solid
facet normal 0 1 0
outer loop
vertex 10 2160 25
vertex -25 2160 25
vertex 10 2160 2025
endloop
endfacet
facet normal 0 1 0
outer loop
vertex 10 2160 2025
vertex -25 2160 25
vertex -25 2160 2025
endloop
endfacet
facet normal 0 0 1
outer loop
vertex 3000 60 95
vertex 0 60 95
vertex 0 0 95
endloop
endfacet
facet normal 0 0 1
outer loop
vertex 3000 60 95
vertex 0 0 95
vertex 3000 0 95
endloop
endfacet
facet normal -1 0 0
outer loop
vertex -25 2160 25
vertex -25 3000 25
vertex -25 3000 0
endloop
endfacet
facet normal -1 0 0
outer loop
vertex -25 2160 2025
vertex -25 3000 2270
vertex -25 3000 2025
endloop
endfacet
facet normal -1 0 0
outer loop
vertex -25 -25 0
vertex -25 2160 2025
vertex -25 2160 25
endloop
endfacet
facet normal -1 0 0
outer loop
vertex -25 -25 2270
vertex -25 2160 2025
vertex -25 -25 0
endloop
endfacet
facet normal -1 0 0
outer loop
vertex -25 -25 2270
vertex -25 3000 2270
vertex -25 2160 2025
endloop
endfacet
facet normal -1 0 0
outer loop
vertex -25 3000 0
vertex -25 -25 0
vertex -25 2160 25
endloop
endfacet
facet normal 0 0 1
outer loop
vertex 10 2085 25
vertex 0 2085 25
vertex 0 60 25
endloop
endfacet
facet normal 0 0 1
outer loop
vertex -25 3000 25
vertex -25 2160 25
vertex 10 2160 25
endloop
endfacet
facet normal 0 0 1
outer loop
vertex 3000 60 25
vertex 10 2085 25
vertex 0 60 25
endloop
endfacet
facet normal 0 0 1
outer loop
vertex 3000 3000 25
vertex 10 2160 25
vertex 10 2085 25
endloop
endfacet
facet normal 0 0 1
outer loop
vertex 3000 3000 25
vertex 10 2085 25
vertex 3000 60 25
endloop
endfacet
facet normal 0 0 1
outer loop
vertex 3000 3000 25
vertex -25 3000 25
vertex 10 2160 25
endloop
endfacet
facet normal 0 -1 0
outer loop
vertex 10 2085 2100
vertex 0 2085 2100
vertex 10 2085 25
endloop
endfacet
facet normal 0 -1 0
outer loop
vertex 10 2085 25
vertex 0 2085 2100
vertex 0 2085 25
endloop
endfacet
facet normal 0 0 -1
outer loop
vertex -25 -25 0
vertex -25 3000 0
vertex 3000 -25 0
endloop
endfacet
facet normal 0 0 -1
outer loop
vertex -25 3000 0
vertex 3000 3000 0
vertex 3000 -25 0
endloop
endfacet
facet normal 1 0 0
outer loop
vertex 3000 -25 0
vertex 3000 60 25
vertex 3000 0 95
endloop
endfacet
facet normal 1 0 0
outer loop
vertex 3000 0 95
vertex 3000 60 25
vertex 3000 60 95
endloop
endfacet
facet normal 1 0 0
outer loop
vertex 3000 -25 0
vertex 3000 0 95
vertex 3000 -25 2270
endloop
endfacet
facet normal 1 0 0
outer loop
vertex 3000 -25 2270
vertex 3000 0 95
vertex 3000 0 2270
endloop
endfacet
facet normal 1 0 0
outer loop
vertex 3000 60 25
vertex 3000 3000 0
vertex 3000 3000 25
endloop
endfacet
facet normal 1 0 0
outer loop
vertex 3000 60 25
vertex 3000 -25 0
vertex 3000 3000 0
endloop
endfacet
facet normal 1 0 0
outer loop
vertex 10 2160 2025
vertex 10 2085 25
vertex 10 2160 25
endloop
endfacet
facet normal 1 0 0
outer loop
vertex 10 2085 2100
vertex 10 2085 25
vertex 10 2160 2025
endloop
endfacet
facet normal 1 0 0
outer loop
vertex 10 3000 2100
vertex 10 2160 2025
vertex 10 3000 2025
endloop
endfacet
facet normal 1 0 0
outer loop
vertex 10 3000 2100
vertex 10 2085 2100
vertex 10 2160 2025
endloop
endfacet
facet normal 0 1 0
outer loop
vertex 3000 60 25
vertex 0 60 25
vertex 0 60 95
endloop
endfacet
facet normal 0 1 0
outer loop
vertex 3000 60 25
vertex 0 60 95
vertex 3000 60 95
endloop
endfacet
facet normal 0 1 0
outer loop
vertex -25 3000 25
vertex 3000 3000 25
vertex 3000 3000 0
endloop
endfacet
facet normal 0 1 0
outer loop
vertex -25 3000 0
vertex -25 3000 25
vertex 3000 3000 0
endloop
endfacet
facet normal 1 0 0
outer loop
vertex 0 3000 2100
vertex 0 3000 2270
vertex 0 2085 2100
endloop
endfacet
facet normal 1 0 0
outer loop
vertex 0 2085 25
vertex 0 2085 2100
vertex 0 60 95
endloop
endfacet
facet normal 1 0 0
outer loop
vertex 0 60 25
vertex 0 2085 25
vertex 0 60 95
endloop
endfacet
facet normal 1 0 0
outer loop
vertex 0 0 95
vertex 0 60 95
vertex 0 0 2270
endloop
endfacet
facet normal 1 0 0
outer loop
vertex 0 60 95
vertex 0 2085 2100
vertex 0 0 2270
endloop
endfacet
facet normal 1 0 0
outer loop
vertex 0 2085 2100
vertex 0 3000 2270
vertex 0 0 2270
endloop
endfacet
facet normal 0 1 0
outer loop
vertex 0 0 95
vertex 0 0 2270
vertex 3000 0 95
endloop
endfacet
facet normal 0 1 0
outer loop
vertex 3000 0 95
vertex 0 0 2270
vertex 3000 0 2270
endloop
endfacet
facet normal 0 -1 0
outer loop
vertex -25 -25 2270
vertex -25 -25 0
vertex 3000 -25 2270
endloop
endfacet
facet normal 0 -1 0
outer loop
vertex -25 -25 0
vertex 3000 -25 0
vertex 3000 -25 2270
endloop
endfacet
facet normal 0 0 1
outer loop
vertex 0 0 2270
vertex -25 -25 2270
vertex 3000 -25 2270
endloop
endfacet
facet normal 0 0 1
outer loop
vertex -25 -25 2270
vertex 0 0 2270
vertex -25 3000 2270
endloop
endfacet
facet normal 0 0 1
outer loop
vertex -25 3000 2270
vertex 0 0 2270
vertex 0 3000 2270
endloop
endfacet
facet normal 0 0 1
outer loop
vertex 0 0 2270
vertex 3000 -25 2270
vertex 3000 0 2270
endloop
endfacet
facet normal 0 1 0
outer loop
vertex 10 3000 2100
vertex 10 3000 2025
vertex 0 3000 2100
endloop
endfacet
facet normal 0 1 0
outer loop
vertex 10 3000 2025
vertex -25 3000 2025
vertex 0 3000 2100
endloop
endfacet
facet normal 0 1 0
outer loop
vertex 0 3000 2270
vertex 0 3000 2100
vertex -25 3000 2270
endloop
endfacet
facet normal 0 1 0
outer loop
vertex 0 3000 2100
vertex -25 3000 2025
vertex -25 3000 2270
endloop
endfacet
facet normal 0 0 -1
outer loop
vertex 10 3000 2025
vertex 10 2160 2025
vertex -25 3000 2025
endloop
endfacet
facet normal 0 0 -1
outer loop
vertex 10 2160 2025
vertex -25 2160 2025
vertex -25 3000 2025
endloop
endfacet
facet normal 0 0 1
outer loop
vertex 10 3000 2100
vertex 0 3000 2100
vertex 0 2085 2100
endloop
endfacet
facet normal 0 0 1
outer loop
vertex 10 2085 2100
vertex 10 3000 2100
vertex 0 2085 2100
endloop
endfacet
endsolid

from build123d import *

# Parameters (mm, degrees)
F0_W      = 3000
F0_H      = 3000
F1_DEPTH  = 25
F2_W      = 3000
F2_H      = 60
F3_DEPTH  = 70
F4_W      = 3000
F4_H      = 2175
F4_H_2    = 95
F5_DEPTH  = 25
F7_DEPTH  = 25
F8_W      = 840
F8_H      = 2000
F9_DEPTH  = 25
F10_DEPTH = 10


with BuildPart() as f1:
    # F0 (on Top) → F1 (new body)
    with BuildSketch(Plane.XY):
        with Locations((1500, 1500)):
            Rectangle(F0_W, F0_H)
    extrude(amount=F1_DEPTH)

    # F2 (on face) → F3 (join)
    with BuildSketch(Plane.XY.offset(25)):
        with Locations((1500, 30)):
            Rectangle(F2_W, F2_H)
    extrude(amount=F3_DEPTH)

    # F4 (on face) → F5 (join)
    with BuildSketch(Plane.XZ):
        with Locations((1500, 1182.5)):
            Rectangle(F4_W, F4_H)
        with Locations((1500, 47.5)):
            Rectangle(F4_W, F4_H_2)
    extrude(amount=F5_DEPTH)

    # F6 (on face) → F7 (join)
    with BuildSketch(Plane(origin=(0, 0, 0), x_dir=(0, -1, 0), z_dir=(-1, 0, 0))):
        Polygon((-3000, 2270), (-3000, 25), (-60, 25), (-60, 95), (0, 95), (0, 2270), align=None)
        Polygon((-3000, 0), (25, 0), (25, 2270), (0, 2270), (0, 95), (-60, 95), (-60, 25), (-3000, 25), align=None)
    extrude(amount=F7_DEPTH)

    # F8 (on face) → F9 (cut)
    with BuildSketch(Plane.YZ):
        with Locations((2580, 1025)):
            Rectangle(F8_W, F8_H)
    extrude(amount=-F9_DEPTH, mode=Mode.SUBTRACT)

    # F8 (on face) → F10 (join)
    with BuildSketch(Plane.YZ):
        Polygon((2085, 25), (2160, 25), (2160, 2025), (3000, 2025), (3000, 2100), (2085, 2100), align=None)
    extrude(amount=F10_DEPTH)


solid = f1.part
